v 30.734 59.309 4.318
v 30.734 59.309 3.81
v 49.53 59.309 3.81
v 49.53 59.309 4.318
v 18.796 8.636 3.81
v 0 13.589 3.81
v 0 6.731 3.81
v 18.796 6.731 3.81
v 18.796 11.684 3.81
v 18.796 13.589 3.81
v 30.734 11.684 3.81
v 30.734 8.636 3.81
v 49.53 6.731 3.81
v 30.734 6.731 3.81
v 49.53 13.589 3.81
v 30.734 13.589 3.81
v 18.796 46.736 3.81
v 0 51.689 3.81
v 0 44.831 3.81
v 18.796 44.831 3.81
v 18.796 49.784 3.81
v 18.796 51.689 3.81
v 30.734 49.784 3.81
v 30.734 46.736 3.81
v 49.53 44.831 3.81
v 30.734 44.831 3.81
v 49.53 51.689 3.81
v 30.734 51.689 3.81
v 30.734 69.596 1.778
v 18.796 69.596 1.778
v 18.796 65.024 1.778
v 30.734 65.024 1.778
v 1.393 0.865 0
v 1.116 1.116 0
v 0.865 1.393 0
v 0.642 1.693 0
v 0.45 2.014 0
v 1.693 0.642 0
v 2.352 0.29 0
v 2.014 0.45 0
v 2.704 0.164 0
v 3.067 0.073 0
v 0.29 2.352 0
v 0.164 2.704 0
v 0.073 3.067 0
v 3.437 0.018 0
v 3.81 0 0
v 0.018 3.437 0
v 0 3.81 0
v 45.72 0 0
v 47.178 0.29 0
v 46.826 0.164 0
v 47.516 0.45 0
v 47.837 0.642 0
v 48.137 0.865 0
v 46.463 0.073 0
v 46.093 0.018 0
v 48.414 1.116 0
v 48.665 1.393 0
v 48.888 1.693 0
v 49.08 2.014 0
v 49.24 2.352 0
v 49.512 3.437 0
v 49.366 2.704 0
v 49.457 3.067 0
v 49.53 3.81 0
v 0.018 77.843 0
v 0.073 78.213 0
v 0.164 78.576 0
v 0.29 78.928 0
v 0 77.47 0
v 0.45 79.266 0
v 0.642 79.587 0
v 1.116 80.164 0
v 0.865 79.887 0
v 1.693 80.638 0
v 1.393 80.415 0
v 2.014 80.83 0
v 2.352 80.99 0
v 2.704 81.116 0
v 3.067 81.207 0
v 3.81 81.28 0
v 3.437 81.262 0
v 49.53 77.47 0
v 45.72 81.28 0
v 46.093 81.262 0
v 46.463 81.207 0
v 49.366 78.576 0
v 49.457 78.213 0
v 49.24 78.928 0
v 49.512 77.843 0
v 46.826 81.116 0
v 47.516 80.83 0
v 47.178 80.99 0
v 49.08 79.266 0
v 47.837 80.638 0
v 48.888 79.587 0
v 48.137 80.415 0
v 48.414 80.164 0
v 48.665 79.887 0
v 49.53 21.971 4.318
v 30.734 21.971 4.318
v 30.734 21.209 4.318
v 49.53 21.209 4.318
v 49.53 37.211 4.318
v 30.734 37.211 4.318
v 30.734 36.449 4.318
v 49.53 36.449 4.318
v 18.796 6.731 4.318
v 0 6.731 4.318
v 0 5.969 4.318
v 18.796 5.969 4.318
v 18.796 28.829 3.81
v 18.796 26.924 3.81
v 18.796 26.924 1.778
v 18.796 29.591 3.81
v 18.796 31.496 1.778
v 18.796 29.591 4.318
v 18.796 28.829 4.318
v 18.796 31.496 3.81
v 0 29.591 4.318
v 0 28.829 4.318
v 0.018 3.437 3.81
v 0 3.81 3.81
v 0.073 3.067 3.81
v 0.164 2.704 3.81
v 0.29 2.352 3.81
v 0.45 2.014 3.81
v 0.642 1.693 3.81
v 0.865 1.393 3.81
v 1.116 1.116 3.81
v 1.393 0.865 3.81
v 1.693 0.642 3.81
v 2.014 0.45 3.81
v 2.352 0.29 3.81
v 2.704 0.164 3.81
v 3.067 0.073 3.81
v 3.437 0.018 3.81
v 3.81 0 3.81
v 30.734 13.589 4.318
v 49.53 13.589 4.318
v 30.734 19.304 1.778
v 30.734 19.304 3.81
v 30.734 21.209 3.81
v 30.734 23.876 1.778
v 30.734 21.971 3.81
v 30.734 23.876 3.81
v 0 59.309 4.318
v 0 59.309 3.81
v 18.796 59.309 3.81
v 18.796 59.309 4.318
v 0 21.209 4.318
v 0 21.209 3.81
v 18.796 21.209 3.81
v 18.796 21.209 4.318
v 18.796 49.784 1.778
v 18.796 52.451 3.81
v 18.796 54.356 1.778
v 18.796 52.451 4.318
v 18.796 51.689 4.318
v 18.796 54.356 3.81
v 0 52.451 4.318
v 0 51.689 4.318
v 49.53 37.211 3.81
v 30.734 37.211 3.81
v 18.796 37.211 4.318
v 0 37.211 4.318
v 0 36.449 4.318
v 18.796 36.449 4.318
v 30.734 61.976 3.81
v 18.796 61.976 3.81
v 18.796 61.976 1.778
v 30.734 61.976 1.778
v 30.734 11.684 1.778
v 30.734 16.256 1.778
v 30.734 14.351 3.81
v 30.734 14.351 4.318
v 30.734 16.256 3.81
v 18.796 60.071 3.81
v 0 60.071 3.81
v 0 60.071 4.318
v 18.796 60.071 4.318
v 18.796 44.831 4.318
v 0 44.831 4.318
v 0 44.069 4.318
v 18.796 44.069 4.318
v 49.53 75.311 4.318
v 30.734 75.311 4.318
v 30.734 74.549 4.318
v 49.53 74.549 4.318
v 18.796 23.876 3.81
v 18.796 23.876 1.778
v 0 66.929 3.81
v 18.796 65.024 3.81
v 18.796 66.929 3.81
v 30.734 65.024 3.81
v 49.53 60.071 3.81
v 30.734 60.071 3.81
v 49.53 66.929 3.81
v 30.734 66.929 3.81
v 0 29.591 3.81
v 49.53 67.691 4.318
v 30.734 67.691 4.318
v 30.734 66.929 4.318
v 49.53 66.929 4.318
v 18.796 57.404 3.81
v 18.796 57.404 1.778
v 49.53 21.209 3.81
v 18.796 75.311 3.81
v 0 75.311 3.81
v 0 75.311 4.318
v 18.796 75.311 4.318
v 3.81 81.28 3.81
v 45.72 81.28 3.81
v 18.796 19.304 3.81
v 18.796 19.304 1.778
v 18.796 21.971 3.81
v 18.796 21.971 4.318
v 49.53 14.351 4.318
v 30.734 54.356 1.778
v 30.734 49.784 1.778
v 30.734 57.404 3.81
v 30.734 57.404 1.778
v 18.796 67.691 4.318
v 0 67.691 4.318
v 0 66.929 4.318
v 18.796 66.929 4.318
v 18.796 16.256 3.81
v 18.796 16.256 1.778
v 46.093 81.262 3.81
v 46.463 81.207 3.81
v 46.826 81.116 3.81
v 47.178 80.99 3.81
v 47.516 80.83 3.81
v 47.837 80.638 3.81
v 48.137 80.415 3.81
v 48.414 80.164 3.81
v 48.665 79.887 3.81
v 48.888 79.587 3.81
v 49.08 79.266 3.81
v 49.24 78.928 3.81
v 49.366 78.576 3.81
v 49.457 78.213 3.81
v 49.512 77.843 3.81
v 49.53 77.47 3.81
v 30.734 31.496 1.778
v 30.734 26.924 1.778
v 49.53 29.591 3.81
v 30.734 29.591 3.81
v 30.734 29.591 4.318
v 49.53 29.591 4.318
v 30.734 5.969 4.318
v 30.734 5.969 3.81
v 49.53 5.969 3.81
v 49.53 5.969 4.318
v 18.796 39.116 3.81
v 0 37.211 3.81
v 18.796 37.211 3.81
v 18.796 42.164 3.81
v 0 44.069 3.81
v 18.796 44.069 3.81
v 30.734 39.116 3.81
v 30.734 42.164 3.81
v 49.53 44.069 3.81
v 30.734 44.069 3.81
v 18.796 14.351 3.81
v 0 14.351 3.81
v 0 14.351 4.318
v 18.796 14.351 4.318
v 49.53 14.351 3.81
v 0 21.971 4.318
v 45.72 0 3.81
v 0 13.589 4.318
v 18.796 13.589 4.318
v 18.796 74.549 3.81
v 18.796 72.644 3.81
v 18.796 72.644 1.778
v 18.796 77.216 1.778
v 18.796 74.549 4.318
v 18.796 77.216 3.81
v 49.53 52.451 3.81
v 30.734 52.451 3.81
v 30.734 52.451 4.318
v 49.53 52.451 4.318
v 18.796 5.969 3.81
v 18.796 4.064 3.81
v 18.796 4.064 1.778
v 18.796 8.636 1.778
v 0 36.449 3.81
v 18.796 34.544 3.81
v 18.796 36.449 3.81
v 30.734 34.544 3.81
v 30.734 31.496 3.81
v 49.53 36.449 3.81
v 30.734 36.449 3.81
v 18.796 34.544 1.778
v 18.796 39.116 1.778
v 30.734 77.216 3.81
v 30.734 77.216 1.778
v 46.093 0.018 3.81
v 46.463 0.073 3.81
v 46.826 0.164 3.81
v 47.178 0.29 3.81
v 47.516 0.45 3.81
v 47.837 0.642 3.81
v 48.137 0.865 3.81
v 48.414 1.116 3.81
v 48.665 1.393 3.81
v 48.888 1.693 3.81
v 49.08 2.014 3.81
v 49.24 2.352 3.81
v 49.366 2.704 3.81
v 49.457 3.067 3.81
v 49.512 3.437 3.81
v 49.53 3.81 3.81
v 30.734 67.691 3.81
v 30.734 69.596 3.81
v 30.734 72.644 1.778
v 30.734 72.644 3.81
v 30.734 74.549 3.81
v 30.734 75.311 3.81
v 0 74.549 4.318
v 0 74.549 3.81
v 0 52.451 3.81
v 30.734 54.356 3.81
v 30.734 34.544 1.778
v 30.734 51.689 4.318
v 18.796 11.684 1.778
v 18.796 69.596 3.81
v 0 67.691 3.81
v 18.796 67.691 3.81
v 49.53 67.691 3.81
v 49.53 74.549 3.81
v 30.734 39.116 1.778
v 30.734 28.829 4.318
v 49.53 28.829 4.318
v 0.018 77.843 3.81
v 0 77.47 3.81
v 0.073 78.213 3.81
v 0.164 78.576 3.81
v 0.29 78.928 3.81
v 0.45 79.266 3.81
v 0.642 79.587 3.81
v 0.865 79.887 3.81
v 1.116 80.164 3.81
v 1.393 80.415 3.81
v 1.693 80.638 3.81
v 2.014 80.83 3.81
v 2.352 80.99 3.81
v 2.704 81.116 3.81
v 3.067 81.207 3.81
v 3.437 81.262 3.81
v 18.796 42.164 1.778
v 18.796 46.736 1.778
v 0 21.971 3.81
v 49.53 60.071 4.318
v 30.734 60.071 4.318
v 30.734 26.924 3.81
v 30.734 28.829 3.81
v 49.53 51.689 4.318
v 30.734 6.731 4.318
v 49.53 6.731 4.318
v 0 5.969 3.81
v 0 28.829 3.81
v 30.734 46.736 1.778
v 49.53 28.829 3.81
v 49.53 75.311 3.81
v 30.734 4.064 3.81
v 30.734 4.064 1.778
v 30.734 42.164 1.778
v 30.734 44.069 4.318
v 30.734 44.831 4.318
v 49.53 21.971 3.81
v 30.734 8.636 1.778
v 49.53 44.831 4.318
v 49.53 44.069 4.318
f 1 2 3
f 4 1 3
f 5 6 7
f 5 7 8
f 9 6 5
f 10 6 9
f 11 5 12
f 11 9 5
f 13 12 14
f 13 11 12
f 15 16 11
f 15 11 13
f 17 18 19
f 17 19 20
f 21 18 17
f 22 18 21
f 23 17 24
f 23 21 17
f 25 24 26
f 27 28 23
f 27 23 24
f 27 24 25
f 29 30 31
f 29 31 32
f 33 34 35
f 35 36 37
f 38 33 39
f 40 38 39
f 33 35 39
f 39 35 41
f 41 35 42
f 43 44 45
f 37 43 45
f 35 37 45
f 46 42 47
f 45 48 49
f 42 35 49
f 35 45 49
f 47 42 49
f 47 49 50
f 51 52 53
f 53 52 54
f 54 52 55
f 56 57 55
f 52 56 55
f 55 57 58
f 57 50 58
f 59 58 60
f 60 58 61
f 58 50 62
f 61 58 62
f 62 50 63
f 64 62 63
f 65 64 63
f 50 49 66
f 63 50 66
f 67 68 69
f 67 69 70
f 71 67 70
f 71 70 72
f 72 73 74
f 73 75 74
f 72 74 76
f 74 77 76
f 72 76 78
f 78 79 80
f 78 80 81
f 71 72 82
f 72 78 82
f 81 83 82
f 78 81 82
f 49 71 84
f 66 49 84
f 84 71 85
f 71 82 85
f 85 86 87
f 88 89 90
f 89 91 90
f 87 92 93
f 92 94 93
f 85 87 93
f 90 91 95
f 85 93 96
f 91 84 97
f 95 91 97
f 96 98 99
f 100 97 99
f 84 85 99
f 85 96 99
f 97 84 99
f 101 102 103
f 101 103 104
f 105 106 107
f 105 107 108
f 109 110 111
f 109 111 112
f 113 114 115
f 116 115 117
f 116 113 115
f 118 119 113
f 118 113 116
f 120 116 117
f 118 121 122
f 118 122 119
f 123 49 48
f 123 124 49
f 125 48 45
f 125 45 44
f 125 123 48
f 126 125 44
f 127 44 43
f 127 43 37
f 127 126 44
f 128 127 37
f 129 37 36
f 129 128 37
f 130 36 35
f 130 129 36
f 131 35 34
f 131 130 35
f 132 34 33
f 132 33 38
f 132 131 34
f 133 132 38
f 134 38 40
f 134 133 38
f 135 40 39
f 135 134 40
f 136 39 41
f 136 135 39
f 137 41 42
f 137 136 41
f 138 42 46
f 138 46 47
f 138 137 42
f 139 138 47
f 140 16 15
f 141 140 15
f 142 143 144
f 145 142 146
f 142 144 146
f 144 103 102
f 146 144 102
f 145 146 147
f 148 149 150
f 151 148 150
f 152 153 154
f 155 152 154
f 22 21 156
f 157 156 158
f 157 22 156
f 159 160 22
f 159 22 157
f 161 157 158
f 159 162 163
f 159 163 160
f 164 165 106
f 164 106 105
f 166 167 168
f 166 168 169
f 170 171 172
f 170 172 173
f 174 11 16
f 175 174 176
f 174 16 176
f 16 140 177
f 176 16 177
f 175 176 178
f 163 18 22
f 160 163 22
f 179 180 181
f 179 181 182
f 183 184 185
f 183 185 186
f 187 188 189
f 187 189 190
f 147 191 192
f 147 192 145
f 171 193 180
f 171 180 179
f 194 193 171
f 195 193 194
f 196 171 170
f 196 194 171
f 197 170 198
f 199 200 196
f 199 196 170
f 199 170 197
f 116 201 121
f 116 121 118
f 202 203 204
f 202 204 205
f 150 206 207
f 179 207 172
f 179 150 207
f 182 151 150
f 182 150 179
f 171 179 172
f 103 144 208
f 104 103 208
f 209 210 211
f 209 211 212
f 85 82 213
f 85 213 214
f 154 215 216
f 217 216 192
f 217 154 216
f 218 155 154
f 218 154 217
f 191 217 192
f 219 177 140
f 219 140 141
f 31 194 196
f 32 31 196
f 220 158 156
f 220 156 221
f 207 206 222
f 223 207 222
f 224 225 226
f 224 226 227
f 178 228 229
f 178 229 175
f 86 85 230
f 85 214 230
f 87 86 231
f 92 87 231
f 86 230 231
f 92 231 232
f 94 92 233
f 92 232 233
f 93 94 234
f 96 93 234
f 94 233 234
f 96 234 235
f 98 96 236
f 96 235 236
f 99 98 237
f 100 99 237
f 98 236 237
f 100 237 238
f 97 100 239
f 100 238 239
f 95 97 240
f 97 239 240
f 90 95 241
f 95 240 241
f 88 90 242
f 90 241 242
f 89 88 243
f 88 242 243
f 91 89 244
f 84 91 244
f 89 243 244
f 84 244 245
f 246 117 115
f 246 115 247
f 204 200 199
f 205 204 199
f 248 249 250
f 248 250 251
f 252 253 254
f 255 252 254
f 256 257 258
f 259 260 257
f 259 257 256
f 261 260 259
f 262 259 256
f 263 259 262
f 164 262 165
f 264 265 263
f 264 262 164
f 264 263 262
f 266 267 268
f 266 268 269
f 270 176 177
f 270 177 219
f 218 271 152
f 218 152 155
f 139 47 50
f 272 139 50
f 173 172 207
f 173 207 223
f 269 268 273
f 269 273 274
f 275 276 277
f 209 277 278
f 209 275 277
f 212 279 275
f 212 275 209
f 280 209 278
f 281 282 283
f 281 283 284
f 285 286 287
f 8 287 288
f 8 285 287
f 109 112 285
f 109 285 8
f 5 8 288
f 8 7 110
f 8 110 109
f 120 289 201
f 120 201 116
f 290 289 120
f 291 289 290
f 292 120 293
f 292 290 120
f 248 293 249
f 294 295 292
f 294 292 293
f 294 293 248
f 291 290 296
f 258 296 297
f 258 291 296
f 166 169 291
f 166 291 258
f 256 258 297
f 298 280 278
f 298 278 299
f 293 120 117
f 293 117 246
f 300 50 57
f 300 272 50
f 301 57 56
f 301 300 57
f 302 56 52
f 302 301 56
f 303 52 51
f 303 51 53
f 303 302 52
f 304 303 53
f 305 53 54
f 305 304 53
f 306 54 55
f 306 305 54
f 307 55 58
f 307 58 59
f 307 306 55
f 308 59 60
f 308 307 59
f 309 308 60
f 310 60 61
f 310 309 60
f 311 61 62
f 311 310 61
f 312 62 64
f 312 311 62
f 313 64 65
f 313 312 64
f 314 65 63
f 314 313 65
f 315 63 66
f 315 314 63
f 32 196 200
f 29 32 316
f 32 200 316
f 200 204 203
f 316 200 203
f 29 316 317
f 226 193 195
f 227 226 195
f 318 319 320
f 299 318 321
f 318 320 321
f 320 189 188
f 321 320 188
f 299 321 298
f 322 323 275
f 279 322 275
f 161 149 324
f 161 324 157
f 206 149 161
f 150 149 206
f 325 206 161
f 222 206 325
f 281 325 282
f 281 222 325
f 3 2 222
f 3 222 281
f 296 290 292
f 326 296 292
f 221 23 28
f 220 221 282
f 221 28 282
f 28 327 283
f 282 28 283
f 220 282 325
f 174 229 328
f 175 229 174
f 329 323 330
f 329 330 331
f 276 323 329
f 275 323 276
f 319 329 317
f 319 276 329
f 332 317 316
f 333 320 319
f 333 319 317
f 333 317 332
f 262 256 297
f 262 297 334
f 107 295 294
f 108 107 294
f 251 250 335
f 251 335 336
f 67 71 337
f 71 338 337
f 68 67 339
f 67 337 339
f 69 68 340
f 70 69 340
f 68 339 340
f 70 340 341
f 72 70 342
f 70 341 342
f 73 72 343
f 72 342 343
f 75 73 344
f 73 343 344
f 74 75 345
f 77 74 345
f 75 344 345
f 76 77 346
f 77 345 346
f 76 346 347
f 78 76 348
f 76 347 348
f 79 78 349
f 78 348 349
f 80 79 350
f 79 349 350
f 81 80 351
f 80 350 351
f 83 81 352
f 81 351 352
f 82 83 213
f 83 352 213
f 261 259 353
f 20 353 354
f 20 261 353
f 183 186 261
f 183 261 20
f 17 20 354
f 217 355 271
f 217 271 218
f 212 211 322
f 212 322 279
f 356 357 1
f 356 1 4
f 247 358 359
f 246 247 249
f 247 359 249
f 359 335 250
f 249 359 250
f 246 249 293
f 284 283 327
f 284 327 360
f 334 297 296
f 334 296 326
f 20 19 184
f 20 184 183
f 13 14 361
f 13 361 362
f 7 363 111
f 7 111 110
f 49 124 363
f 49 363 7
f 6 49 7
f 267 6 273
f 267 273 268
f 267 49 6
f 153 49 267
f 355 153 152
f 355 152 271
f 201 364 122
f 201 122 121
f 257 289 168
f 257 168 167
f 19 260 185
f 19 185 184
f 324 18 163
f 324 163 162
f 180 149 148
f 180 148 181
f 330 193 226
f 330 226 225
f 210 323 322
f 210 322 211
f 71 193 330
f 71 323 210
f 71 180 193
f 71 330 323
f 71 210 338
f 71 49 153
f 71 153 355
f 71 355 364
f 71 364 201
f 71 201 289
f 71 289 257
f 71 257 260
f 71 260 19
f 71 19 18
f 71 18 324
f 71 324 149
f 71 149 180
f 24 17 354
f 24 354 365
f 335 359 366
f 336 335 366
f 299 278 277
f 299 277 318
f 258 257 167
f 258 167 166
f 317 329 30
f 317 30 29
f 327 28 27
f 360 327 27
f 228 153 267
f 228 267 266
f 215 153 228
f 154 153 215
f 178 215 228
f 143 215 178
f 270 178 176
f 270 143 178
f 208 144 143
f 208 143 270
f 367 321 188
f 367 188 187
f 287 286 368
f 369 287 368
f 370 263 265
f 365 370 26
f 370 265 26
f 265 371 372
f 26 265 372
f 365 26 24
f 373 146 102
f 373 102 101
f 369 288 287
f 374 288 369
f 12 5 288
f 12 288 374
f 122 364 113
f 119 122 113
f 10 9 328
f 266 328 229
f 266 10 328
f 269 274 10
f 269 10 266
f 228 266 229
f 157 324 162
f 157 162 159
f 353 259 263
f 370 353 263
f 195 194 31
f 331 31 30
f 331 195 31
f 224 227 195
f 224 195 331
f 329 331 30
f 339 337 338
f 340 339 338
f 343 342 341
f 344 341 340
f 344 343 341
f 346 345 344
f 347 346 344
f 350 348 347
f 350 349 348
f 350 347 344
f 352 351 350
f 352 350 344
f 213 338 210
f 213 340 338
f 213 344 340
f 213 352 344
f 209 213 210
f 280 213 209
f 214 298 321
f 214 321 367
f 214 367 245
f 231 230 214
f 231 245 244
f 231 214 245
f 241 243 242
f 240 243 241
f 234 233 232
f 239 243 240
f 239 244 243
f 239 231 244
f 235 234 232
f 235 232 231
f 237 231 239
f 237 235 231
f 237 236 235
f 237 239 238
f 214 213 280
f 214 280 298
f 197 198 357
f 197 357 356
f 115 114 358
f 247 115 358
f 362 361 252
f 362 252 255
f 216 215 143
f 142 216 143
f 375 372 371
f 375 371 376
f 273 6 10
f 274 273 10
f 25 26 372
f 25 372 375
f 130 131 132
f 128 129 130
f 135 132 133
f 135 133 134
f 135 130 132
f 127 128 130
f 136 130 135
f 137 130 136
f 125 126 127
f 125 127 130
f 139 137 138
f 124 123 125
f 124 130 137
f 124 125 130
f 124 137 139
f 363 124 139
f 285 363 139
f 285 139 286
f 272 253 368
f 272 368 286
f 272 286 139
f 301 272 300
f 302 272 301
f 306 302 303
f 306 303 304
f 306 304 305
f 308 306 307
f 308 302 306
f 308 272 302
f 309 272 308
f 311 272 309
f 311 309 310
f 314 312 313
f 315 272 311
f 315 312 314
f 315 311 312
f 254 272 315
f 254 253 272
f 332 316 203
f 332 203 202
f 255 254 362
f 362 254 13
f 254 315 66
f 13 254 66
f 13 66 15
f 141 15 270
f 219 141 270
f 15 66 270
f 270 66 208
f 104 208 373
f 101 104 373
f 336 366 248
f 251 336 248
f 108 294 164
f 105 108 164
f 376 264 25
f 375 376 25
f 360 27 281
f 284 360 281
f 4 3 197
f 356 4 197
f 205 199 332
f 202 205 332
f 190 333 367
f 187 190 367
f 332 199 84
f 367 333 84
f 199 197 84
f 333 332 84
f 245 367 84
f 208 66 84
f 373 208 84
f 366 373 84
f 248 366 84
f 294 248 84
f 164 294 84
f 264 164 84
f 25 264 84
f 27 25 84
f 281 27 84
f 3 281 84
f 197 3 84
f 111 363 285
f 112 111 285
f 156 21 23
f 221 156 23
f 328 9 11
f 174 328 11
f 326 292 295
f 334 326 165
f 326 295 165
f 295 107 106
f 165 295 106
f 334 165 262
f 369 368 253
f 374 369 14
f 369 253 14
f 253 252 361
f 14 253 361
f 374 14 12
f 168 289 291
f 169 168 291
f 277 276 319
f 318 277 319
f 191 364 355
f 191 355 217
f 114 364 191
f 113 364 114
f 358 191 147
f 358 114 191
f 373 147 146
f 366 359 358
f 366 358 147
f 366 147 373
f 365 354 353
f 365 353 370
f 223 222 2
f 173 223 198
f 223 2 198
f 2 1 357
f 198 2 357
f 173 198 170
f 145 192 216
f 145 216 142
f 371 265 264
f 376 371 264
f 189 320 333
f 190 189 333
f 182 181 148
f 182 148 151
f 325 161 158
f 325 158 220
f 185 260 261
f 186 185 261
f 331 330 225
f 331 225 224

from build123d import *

# Parameters (mm, degrees)
F0_W     = 49.53
F0_H     = 81.28
F1_DEPTH = 3.81
F2_W     = 11.938
F2_H     = 4.572
F3_DEPTH = 2.032
F4_W     = 18.796
F4_H     = 0.762
F5_DEPTH = 0.508
F6_R     = 3.81


with BuildPart() as f1:
    # F0 (on Top) → F1 (new body)
    with BuildSketch(Plane.XY):
        with Locations((24.765, 40.64)):
            Rectangle(F0_W, F0_H)
    extrude(amount=F1_DEPTH)

    # F2 (on face) → F3 (cut)
    with BuildSketch(Plane.XY.offset(3.81)):
        with Locations((24.765, 6.35)):
            Rectangle(F2_W, F2_H)
        with Locations((24.765, 13.97)):
            Rectangle(F2_W, F2_H)
        with Locations((24.765, 21.59)):
            Rectangle(F2_W, F2_H)
        with Locations((24.765, 29.21)):
            Rectangle(F2_W, F2_H)
        with Locations((24.765, 36.83)):
            Rectangle(F2_W, F2_H)
        with Locations((24.765, 44.45)):
            Rectangle(F2_W, F2_H)
        with Locations((24.765, 52.07)):
            Rectangle(F2_W, F2_H)
        with Locations((24.765, 59.69)):
            Rectangle(F2_W, F2_H)
        with Locations((24.765, 67.31)):
            Rectangle(F2_W, F2_H)
        with Locations((24.765, 74.93)):
            Rectangle(F2_W, F2_H)
    extrude(amount=-F3_DEPTH, mode=Mode.SUBTRACT)

    # F4 (on face) → F5 (join)
    with BuildSketch(Plane.XY.offset(3.81)):
        with Locations((40.132, 6.35)):
            Rectangle(F4_W, F4_H)
        with Locations((9.398, 6.35)):
            Rectangle(F4_W, F4_H)
        with Locations((9.398, 13.97)):
            Rectangle(F4_W, F4_H)
        with Locations((40.132, 13.97)):
            Rectangle(F4_W, F4_H)
        with Locations((9.398, 21.59)):
            Rectangle(F4_W, F4_H)
        with Locations((40.132, 21.59)):
            Rectangle(F4_W, F4_H)
        with Locations((9.398, 29.21)):
            Rectangle(F4_W, F4_H)
        with Locations((40.132, 29.21)):
            Rectangle(F4_W, F4_H)
        with Locations((9.398, 36.83)):
            Rectangle(F4_W, F4_H)
        with Locations((40.132, 36.83)):
            Rectangle(F4_W, F4_H)
        with Locations((9.398, 44.45)):
            Rectangle(F4_W, F4_H)
        with Locations((40.132, 44.45)):
            Rectangle(F4_W, F4_H)
        with Locations((9.398, 52.07)):
            Rectangle(F4_W, F4_H)
        with Locations((40.132, 52.07)):
            Rectangle(F4_W, F4_H)
        with Locations((9.398, 59.69)):
            Rectangle(F4_W, F4_H)
        with Locations((40.132, 59.69)):
            Rectangle(F4_W, F4_H)
        with Locations((9.398, 67.31)):
            Rectangle(F4_W, F4_H)
        with Locations((40.132, 67.31)):
            Rectangle(F4_W, F4_H)
        with Locations((9.398, 74.93)):
            Rectangle(F4_W, F4_H)
        with Locations((40.132, 74.93)):
            Rectangle(F4_W, F4_H)
    extrude(amount=F5_DEPTH)

    # F6
    f6_edges = [f1.edges().sort_by_distance(p)[0] for p in [
        (49.53, 0, 1.905),
        (0, 0, 1.905),
        (0, 81.28, 1.905),
        (49.53, 81.28, 1.905),
    ]]
    fillet(f6_edges, radius=F6_R)


solid = f1.part
